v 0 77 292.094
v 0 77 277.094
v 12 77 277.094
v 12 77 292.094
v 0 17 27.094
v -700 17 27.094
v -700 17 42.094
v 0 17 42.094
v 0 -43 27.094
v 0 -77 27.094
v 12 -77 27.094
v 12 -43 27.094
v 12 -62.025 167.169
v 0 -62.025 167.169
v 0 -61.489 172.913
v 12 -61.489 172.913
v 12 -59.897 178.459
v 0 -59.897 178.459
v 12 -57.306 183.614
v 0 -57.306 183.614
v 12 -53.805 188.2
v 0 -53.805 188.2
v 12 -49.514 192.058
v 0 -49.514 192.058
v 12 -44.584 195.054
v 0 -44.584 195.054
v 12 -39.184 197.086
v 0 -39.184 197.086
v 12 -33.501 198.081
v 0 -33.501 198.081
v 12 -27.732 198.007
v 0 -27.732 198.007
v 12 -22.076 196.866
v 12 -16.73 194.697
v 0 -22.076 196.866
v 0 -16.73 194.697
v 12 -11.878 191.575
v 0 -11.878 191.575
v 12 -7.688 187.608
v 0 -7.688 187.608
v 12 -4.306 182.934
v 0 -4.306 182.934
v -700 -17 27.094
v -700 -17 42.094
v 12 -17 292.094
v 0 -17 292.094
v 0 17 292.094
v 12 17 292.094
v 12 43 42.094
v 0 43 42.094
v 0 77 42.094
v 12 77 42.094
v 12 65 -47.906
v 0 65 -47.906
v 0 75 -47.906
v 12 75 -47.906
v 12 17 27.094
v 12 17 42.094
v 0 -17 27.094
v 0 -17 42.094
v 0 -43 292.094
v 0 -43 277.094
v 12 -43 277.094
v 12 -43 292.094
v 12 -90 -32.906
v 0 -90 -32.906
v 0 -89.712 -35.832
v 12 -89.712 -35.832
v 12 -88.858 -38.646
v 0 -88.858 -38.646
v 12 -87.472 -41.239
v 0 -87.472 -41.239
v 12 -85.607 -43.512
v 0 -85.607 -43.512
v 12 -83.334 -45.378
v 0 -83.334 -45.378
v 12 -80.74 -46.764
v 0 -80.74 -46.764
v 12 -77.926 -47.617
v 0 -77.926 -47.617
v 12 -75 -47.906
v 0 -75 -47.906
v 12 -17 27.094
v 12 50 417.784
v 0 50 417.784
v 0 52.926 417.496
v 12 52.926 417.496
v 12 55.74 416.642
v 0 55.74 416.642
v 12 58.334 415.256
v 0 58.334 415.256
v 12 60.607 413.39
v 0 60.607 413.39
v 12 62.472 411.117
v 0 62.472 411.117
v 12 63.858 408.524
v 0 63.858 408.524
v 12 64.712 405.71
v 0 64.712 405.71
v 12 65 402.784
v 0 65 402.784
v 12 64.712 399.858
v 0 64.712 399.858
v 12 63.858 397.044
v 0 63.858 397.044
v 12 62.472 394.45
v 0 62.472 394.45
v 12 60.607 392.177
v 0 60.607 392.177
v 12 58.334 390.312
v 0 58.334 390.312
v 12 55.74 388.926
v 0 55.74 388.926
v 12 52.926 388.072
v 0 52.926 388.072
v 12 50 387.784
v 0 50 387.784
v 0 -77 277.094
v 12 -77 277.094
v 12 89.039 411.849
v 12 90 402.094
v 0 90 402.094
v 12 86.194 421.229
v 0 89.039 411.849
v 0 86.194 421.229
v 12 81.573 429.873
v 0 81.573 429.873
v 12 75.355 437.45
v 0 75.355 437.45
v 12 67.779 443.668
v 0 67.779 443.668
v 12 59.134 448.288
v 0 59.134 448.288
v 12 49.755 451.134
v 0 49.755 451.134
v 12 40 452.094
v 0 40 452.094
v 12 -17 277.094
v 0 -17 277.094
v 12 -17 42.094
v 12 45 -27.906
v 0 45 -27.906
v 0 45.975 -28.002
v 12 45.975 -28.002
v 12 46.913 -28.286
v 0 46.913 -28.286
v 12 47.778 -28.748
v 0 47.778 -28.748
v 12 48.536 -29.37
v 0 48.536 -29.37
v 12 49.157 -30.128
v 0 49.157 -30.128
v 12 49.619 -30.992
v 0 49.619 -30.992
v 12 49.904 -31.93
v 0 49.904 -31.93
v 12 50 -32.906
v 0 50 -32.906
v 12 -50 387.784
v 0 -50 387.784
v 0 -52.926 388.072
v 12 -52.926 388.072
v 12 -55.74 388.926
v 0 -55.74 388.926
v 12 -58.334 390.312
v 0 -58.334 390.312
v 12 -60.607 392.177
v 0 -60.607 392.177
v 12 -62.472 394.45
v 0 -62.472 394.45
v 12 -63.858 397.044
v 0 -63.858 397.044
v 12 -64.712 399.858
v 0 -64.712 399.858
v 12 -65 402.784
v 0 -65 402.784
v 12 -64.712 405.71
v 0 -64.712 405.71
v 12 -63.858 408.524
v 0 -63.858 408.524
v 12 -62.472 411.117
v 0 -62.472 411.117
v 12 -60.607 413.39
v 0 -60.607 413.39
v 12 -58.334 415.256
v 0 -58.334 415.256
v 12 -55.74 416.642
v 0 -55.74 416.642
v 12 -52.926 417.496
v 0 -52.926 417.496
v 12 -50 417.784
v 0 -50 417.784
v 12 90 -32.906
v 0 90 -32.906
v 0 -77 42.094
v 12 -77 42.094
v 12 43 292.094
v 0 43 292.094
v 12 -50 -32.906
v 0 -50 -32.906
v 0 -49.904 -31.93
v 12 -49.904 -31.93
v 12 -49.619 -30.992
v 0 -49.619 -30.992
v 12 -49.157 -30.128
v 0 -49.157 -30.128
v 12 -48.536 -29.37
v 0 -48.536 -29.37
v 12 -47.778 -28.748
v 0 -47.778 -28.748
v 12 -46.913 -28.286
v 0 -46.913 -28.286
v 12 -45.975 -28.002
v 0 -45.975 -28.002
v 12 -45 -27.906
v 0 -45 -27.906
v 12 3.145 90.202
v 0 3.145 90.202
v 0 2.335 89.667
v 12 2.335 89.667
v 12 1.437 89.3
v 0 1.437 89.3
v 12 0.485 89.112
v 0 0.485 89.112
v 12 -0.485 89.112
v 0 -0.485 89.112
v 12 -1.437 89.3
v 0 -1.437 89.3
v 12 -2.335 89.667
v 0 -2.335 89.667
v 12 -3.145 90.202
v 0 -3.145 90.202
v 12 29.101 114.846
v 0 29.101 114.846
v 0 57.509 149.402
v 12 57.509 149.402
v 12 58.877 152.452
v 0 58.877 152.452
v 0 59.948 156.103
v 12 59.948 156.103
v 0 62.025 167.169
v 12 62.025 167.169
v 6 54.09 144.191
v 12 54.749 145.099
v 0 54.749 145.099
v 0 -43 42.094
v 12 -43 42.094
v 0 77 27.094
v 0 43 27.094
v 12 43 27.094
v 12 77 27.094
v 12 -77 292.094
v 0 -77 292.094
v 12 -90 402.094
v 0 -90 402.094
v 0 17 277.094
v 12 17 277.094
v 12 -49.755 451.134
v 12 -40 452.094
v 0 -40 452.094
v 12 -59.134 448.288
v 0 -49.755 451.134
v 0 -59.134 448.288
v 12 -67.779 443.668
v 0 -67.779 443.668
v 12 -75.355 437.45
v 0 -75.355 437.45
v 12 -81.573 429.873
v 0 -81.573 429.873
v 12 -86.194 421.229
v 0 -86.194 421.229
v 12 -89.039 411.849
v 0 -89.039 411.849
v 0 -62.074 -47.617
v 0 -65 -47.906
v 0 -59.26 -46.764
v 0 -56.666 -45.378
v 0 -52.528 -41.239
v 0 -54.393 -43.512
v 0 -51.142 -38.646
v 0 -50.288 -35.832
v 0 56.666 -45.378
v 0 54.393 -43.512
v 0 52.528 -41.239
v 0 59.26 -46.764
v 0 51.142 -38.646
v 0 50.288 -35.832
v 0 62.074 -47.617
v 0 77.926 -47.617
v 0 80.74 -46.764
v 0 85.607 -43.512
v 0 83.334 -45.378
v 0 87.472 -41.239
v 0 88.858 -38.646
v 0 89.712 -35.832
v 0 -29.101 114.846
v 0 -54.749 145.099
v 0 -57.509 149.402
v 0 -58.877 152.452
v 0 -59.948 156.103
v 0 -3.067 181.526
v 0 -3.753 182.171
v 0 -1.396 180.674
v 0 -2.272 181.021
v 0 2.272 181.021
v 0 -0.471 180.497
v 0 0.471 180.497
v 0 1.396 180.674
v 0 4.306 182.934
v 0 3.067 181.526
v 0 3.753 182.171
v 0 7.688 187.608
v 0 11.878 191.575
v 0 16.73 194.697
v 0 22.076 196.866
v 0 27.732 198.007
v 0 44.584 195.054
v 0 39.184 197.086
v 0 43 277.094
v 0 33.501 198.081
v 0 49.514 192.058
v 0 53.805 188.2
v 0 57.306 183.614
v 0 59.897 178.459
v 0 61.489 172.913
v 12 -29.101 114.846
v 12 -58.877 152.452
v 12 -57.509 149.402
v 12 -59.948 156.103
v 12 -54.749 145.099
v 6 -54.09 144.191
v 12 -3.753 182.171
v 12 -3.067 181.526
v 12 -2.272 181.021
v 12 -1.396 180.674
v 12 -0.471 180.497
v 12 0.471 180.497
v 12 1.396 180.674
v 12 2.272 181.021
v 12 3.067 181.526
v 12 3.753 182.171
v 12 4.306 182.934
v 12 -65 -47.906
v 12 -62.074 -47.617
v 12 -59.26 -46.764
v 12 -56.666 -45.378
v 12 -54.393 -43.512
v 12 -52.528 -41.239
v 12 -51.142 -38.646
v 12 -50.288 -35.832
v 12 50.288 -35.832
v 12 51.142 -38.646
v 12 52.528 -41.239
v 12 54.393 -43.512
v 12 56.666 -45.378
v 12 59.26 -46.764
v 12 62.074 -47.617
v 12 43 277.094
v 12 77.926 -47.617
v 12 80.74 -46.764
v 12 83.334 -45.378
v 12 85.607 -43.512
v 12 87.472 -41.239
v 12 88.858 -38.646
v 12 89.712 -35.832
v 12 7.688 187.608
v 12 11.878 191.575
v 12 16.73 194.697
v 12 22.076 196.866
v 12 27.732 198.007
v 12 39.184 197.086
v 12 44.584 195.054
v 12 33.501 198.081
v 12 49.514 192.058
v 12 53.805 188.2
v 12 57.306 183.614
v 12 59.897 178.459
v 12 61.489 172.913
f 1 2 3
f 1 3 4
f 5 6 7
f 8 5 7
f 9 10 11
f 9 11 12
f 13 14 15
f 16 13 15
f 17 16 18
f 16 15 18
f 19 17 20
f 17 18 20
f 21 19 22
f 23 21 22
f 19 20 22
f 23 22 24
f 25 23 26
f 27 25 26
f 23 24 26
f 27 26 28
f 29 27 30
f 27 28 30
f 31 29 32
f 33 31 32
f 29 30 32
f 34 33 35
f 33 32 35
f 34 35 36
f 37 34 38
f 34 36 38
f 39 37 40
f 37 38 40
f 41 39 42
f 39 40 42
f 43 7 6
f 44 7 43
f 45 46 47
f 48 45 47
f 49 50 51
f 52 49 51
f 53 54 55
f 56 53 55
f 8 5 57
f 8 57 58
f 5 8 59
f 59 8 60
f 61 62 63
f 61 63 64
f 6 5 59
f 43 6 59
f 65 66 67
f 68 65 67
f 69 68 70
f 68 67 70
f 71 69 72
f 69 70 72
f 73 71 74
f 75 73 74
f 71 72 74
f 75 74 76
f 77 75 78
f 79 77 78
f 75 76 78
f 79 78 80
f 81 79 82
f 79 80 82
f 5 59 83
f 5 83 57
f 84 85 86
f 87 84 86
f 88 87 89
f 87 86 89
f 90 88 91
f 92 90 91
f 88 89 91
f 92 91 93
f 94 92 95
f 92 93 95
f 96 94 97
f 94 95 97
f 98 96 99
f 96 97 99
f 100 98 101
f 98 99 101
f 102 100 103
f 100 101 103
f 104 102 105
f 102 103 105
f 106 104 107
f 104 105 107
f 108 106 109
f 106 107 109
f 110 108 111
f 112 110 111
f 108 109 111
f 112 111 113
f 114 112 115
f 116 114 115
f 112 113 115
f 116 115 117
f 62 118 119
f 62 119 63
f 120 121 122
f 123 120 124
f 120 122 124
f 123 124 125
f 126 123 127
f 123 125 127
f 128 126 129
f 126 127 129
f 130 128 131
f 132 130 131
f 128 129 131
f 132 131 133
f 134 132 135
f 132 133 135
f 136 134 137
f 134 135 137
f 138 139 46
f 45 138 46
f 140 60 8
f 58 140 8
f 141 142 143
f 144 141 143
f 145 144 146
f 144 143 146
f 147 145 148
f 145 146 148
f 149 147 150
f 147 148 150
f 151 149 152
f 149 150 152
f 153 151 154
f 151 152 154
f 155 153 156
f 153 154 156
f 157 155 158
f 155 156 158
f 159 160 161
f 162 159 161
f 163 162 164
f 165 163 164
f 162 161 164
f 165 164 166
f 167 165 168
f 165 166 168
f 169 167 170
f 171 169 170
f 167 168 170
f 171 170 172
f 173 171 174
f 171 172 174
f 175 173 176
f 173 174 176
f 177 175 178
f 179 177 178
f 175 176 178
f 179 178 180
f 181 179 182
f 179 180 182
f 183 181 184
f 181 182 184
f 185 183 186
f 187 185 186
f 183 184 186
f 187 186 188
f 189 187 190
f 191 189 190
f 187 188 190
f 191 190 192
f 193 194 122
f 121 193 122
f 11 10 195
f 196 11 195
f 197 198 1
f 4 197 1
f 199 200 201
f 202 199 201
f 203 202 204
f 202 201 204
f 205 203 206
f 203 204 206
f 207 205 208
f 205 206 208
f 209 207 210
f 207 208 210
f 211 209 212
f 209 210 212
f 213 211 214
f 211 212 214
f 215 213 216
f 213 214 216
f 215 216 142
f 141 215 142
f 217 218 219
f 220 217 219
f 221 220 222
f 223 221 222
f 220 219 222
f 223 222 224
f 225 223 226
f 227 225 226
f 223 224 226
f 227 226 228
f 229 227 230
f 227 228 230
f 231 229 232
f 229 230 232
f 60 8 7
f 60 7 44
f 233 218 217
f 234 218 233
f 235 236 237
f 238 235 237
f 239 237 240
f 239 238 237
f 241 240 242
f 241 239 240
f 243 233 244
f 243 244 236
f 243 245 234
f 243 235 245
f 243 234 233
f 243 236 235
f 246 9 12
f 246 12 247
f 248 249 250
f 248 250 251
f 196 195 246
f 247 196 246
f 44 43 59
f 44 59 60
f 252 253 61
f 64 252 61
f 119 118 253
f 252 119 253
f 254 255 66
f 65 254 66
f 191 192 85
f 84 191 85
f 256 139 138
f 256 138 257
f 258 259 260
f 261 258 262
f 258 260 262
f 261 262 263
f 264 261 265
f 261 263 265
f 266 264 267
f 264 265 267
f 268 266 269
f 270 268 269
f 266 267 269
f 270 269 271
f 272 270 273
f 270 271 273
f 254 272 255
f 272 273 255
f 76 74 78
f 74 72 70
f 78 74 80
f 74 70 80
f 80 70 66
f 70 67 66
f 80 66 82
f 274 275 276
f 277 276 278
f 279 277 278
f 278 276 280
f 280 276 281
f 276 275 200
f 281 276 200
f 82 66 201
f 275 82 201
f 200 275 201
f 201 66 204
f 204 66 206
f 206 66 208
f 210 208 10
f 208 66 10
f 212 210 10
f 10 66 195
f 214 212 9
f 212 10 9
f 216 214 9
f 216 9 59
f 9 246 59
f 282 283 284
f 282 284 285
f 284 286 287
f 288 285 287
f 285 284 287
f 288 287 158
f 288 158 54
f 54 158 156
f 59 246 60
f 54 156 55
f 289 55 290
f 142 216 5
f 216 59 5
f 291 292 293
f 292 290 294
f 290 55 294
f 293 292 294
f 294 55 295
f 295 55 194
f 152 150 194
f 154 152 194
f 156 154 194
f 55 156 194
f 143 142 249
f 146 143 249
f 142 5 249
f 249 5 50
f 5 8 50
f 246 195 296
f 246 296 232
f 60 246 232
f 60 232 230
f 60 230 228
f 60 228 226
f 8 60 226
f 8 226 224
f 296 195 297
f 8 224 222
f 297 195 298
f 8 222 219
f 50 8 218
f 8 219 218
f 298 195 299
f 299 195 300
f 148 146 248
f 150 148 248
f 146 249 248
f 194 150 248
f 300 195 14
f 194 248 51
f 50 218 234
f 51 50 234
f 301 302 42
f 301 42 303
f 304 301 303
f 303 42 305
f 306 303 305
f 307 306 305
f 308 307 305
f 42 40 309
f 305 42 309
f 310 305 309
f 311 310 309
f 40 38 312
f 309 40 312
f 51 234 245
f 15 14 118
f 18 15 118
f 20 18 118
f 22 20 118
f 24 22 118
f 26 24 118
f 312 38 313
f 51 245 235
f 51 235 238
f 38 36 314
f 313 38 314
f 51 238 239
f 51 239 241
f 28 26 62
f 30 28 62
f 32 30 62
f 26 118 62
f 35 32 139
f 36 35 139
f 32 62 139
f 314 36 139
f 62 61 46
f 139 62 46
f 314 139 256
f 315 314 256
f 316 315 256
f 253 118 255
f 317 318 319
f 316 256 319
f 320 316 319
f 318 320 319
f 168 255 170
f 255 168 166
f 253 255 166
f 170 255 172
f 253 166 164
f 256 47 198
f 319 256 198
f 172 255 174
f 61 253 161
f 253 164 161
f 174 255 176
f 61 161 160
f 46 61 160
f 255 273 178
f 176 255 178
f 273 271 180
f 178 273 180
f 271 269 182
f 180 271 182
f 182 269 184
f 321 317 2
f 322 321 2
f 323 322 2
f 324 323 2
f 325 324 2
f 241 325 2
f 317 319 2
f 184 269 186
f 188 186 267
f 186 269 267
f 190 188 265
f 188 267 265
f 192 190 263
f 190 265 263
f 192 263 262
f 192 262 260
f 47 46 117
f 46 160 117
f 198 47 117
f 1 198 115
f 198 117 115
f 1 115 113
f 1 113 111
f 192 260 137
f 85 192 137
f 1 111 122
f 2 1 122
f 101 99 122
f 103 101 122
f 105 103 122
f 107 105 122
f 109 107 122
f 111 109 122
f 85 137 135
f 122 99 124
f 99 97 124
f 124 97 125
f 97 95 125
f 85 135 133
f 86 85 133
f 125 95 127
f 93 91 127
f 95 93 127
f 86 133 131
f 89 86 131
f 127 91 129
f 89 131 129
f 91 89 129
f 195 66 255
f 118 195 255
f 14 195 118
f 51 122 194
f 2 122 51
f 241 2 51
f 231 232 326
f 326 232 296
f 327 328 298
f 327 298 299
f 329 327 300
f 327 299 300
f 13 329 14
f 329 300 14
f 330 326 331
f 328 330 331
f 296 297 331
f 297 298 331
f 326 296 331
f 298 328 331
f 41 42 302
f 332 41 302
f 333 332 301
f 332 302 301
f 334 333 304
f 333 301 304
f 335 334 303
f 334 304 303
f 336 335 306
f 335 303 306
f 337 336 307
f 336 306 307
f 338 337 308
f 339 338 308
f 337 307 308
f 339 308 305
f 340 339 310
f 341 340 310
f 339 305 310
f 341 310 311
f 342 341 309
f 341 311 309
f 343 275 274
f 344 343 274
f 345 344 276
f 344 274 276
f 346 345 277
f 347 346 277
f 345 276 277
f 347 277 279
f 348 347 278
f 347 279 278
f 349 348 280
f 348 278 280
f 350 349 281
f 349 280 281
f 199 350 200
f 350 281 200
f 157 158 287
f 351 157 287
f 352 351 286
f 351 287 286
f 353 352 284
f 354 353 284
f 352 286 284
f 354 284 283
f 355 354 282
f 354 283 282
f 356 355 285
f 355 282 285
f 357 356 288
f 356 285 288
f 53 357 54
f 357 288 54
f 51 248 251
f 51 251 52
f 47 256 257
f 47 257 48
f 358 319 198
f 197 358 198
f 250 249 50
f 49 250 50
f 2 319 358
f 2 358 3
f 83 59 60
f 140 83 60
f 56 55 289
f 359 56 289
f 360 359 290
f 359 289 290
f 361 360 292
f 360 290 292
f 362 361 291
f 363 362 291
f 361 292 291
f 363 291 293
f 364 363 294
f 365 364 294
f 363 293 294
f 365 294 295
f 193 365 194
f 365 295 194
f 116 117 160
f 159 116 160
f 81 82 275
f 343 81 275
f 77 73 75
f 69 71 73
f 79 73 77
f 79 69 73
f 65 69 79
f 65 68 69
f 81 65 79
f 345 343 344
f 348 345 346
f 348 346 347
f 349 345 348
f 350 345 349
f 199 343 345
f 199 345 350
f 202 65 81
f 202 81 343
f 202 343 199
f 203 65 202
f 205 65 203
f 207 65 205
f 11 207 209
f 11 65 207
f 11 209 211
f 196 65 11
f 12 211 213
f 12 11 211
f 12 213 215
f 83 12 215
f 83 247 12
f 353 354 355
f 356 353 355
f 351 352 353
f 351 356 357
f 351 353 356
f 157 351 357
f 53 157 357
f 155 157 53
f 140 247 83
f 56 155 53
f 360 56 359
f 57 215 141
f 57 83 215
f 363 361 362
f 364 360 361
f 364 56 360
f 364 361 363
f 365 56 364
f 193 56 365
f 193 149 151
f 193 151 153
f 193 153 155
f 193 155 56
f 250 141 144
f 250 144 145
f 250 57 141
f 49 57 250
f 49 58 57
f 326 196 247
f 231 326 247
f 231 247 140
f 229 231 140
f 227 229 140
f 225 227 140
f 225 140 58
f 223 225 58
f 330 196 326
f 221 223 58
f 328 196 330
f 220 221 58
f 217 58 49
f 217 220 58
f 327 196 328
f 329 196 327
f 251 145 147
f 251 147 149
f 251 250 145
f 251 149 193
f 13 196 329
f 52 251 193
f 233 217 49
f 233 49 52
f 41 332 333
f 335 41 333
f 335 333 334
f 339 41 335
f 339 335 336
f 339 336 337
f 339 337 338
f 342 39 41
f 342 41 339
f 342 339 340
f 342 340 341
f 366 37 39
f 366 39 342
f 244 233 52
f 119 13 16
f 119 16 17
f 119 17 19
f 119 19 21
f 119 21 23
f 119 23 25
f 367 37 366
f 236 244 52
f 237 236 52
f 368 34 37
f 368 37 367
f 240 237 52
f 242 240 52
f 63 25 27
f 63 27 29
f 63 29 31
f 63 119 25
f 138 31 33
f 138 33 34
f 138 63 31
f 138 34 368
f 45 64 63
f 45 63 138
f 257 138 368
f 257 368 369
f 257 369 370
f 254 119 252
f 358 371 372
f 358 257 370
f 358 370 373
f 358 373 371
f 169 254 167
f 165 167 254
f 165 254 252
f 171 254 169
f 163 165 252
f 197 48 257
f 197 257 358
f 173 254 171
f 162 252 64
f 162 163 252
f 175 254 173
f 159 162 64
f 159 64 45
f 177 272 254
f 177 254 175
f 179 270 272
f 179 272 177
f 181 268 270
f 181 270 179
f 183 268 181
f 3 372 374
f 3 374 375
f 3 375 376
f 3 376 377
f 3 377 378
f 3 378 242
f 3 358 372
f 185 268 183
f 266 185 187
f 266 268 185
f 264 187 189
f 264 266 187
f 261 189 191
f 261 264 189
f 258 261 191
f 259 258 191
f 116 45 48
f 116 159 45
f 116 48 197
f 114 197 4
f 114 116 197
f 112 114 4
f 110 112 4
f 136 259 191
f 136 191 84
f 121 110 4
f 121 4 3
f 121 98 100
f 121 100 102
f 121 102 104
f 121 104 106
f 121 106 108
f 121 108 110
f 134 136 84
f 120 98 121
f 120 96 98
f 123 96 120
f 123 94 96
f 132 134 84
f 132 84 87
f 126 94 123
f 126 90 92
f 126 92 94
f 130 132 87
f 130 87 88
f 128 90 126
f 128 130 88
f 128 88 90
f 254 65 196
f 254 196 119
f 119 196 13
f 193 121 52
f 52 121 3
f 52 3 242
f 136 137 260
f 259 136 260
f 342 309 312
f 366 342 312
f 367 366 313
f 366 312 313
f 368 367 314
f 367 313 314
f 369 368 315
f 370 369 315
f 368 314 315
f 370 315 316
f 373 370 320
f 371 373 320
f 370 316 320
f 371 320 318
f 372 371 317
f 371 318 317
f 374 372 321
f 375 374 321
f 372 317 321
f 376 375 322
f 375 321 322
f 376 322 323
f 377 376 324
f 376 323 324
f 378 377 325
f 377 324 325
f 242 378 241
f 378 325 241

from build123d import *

# Parameters (mm, degrees)
F0_W     = 34
F0_H     = 15
F1_DEPTH = 12
F2_W     = 34
F2_H     = 15
F3_DEPTH = 700


with BuildPart() as f1:
    # F0 (on Right) → F1 (new body)
    with BuildSketch(Plane.YZ):
        with BuildLine():
            Line((0, 452.0943418145), (-40, 452.0943418145))
            ThreePointArc((-40, 452.0943418145), (-75.3553390593, 437.4496808738), (-90, 402.0943418145))
            Line((-90, 402.0943418145), (-90, -32.9056581855))
            ThreePointArc((-90, -32.9056581855), (-85.6066017178, -43.5122599033), (-75, -47.9056581855))
            Line((-75, -47.9056581855), (-65, -47.9056581855))
            ThreePointArc((-65, -47.9056581855), (-54.3933982822, -43.5122599033), (-50, -32.9056581855))
            ThreePointArc((-50, -32.9056581855), (-48.5355339059, -29.3701242795), (-45, -27.9056581855))
            Line((-45, -27.9056581855), (45, -27.9056581855))
            ThreePointArc((45, -27.9056581855), (48.5355339059, -29.3701242795), (50, -32.9056581855))
            ThreePointArc((50, -32.9056581855), (54.3933982822, -43.5122599033), (65, -47.9056581855))
            Line((65, -47.9056581855), (75, -47.9056581855))
            ThreePointArc((75, -47.9056581855), (85.6066017178, -43.5122599033), (90, -32.9056581855))
            Line((90, -32.9056581855), (90, 402.0943418145))
            ThreePointArc((90, 402.0943418145), (75.3553390593, 437.4496808738), (40, 452.0943418145))
            Line((40, 452.0943418145), (0, 452.0943418145))
        make_face()
        with Locations((-60, 34.5943418145)):
            Rectangle(F0_W, F0_H, mode=Mode.SUBTRACT)
        with Locations((0, 34.5943418145)):
            Rectangle(F0_W, F0_H, mode=Mode.SUBTRACT)
        with Locations((60, 34.5943418145)):
            Rectangle(F0_W, F0_H, mode=Mode.SUBTRACT)
        with BuildLine():
            ThreePointArc((4.3057986639, 182.9335873252), (39.183716083, 197.0856083174), (62.0252142978, 167.1688106786))
            add(Edge.make_bspline(
                [(3.1446835541, 90.2015406127), (22.3537729205, 105.7410613962), (58.6775915843, 147.6474664313), (59.6779100597, 153.4350961447), (62.0252142978, 167.1688106786)],
                knots=[0.0335863635, 0.0335863635, 0.0335863635, 0.0335863635, 0.6420190055, 1, 1, 1, 1], degree=3))
            add(Edge.make_bspline(
                [(0, 87.7314905125), (1.0350959007, 88.5189757858), (2.0843139865, 89.3437365482), (3.1446835541, 90.2015406127)],
                knots=[0, 0, 0, 0, 0.0335863635, 0.0335863635, 0.0335863635, 0.0335863635], degree=3))
            add(Edge.make_bspline(
                [(0, 87.7314905125), (-1.0350959007, 88.5189757858), (-2.0843139865, 89.3437365482), (-3.1446835541, 90.2015406127)],
                knots=[0, 0, 0, 0, 0.0335863635, 0.0335863635, 0.0335863635, 0.0335863635], degree=3))
            add(Edge.make_bspline(
                [(-3.1446835541, 90.2015406127), (-22.3537729205, 105.7410613962), (-58.6775915843, 147.6474664313), (-59.6779100597, 153.4350961447), (-62.0252142978, 167.1688106786)],
                knots=[0.0335863635, 0.0335863635, 0.0335863635, 0.0335863635, 0.6420190055, 1, 1, 1, 1], degree=3))
            ThreePointArc((-62.0252142978, 167.1688106786), (-39.183716083, 197.0856083174), (-4.3057986639, 182.9335873252))
            ThreePointArc((-4.3057986639, 182.9335873252), (0, 180.475259583), (4.3057986639, 182.9335873252))
        make_face(mode=Mode.SUBTRACT)
        with Locations((-60, 284.5943418145)):
            Rectangle(F0_W, F0_H, mode=Mode.SUBTRACT)
        with Locations((0, 284.5943418145)):
            Rectangle(F0_W, F0_H, mode=Mode.SUBTRACT)
        with Locations((60, 284.5943418145)):
            Rectangle(F0_W, F0_H, mode=Mode.SUBTRACT)
        with BuildLine():
            Line((-50, 417.7838551998), (0, 417.7838551998))
            Line((0, 417.7838551998), (50, 417.7838551998))
            ThreePointArc((50, 417.7838551998), (60.6066017178, 413.3904569176), (65, 402.7838551998))
            ThreePointArc((65, 402.7838551998), (60.6066017178, 392.177253482), (50, 387.7838551998))
            Line((50, 387.7838551998), (-50, 387.7838551998))
            ThreePointArc((-50, 387.7838551998), (-60.6066017178, 392.177253482), (-65, 402.7838551998))
            ThreePointArc((-65, 402.7838551998), (-60.6066017178, 413.3904569176), (-50, 417.7838551998))
        make_face(mode=Mode.SUBTRACT)
        with BuildLine():
            add(Edge.make_bspline(
                [(0, 87.7314905125), (1.0350959007, 88.5189757858), (2.0843139865, 89.3437365482), (3.1446835541, 90.2015406127)],
                knots=[0, 0, 0, 0, 0.0335863635, 0.0335863635, 0.0335863635, 0.0335863635], degree=3))
            ThreePointArc((3.1446835541, 90.2015406127), (0, 89.0888231268), (-3.1446835541, 90.2015406127))
            add(Edge.make_bspline(
                [(0, 87.7314905125), (-1.0350959007, 88.5189757858), (-2.0843139865, 89.3437365482), (-3.1446835541, 90.2015406127)],
                knots=[0, 0, 0, 0, 0.0335863635, 0.0335863635, 0.0335863635, 0.0335863635], degree=3))
        make_face()
    extrude(amount=F1_DEPTH)


with BuildPart() as f3:
    # F2 (on face) → F3 (new body)
    with BuildSketch(Plane(origin=(0, 0, 0), x_dir=(0, -1, 0), z_dir=(-1, 0, 0))):
        with Locations((0, 34.5943418145)):
            Rectangle(F2_W, F2_H)
    extrude(amount=F3_DEPTH)


solid = Compound([f1.part, f3.part])
